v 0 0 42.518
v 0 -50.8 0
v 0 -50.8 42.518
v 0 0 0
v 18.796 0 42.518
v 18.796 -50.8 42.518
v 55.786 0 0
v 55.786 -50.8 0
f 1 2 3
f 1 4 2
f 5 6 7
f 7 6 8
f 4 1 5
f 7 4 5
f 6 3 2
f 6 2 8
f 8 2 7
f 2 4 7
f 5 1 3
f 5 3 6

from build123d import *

# Parameters (mm, degrees)
F0_W     = 55.7858683169
F0_H     = 42.5178781152
F1_DEPTH = 25.4
F2_DEPTH = 25.4
F4_DEPTH = 25.4
F5_DEPTH = 25.4


with BuildPart() as f1:
    # F0 (on Front) → F1 (new body)
    with BuildSketch(Plane.XZ):
        with Locations((27.8929341584, 21.2589390576)):
            Rectangle(F0_W, F0_H)
    extrude(amount=F1_DEPTH)

    # F2 (add): a face of the model
    f2_faces = [f1.faces().sort_by_distance(p)[0] for p in [
        (27.8929341584, -25.4, 21.2589390576),
    ]]
    extrude(f2_faces, amount=F2_DEPTH)

    # F3 (on face) → F4 (cut)
    with BuildSketch(Plane.XZ.offset(50.8)):
        Polygon((55.7858683169, 42.5178781152), (18.7963210046, 42.5178781152), (55.7858683169, 0), align=None)
    extrude(amount=-F4_DEPTH, mode=Mode.SUBTRACT)

    # F5 (cut): a face of the model
    f5_faces = [f1.faces().sort_by_distance(p)[0] for p in [
        (43.4560192128, -25.4, 28.3452520768),
    ]]
    extrude(f5_faces, amount=-F5_DEPTH, mode=Mode.SUBTRACT)


solid = f1.part
